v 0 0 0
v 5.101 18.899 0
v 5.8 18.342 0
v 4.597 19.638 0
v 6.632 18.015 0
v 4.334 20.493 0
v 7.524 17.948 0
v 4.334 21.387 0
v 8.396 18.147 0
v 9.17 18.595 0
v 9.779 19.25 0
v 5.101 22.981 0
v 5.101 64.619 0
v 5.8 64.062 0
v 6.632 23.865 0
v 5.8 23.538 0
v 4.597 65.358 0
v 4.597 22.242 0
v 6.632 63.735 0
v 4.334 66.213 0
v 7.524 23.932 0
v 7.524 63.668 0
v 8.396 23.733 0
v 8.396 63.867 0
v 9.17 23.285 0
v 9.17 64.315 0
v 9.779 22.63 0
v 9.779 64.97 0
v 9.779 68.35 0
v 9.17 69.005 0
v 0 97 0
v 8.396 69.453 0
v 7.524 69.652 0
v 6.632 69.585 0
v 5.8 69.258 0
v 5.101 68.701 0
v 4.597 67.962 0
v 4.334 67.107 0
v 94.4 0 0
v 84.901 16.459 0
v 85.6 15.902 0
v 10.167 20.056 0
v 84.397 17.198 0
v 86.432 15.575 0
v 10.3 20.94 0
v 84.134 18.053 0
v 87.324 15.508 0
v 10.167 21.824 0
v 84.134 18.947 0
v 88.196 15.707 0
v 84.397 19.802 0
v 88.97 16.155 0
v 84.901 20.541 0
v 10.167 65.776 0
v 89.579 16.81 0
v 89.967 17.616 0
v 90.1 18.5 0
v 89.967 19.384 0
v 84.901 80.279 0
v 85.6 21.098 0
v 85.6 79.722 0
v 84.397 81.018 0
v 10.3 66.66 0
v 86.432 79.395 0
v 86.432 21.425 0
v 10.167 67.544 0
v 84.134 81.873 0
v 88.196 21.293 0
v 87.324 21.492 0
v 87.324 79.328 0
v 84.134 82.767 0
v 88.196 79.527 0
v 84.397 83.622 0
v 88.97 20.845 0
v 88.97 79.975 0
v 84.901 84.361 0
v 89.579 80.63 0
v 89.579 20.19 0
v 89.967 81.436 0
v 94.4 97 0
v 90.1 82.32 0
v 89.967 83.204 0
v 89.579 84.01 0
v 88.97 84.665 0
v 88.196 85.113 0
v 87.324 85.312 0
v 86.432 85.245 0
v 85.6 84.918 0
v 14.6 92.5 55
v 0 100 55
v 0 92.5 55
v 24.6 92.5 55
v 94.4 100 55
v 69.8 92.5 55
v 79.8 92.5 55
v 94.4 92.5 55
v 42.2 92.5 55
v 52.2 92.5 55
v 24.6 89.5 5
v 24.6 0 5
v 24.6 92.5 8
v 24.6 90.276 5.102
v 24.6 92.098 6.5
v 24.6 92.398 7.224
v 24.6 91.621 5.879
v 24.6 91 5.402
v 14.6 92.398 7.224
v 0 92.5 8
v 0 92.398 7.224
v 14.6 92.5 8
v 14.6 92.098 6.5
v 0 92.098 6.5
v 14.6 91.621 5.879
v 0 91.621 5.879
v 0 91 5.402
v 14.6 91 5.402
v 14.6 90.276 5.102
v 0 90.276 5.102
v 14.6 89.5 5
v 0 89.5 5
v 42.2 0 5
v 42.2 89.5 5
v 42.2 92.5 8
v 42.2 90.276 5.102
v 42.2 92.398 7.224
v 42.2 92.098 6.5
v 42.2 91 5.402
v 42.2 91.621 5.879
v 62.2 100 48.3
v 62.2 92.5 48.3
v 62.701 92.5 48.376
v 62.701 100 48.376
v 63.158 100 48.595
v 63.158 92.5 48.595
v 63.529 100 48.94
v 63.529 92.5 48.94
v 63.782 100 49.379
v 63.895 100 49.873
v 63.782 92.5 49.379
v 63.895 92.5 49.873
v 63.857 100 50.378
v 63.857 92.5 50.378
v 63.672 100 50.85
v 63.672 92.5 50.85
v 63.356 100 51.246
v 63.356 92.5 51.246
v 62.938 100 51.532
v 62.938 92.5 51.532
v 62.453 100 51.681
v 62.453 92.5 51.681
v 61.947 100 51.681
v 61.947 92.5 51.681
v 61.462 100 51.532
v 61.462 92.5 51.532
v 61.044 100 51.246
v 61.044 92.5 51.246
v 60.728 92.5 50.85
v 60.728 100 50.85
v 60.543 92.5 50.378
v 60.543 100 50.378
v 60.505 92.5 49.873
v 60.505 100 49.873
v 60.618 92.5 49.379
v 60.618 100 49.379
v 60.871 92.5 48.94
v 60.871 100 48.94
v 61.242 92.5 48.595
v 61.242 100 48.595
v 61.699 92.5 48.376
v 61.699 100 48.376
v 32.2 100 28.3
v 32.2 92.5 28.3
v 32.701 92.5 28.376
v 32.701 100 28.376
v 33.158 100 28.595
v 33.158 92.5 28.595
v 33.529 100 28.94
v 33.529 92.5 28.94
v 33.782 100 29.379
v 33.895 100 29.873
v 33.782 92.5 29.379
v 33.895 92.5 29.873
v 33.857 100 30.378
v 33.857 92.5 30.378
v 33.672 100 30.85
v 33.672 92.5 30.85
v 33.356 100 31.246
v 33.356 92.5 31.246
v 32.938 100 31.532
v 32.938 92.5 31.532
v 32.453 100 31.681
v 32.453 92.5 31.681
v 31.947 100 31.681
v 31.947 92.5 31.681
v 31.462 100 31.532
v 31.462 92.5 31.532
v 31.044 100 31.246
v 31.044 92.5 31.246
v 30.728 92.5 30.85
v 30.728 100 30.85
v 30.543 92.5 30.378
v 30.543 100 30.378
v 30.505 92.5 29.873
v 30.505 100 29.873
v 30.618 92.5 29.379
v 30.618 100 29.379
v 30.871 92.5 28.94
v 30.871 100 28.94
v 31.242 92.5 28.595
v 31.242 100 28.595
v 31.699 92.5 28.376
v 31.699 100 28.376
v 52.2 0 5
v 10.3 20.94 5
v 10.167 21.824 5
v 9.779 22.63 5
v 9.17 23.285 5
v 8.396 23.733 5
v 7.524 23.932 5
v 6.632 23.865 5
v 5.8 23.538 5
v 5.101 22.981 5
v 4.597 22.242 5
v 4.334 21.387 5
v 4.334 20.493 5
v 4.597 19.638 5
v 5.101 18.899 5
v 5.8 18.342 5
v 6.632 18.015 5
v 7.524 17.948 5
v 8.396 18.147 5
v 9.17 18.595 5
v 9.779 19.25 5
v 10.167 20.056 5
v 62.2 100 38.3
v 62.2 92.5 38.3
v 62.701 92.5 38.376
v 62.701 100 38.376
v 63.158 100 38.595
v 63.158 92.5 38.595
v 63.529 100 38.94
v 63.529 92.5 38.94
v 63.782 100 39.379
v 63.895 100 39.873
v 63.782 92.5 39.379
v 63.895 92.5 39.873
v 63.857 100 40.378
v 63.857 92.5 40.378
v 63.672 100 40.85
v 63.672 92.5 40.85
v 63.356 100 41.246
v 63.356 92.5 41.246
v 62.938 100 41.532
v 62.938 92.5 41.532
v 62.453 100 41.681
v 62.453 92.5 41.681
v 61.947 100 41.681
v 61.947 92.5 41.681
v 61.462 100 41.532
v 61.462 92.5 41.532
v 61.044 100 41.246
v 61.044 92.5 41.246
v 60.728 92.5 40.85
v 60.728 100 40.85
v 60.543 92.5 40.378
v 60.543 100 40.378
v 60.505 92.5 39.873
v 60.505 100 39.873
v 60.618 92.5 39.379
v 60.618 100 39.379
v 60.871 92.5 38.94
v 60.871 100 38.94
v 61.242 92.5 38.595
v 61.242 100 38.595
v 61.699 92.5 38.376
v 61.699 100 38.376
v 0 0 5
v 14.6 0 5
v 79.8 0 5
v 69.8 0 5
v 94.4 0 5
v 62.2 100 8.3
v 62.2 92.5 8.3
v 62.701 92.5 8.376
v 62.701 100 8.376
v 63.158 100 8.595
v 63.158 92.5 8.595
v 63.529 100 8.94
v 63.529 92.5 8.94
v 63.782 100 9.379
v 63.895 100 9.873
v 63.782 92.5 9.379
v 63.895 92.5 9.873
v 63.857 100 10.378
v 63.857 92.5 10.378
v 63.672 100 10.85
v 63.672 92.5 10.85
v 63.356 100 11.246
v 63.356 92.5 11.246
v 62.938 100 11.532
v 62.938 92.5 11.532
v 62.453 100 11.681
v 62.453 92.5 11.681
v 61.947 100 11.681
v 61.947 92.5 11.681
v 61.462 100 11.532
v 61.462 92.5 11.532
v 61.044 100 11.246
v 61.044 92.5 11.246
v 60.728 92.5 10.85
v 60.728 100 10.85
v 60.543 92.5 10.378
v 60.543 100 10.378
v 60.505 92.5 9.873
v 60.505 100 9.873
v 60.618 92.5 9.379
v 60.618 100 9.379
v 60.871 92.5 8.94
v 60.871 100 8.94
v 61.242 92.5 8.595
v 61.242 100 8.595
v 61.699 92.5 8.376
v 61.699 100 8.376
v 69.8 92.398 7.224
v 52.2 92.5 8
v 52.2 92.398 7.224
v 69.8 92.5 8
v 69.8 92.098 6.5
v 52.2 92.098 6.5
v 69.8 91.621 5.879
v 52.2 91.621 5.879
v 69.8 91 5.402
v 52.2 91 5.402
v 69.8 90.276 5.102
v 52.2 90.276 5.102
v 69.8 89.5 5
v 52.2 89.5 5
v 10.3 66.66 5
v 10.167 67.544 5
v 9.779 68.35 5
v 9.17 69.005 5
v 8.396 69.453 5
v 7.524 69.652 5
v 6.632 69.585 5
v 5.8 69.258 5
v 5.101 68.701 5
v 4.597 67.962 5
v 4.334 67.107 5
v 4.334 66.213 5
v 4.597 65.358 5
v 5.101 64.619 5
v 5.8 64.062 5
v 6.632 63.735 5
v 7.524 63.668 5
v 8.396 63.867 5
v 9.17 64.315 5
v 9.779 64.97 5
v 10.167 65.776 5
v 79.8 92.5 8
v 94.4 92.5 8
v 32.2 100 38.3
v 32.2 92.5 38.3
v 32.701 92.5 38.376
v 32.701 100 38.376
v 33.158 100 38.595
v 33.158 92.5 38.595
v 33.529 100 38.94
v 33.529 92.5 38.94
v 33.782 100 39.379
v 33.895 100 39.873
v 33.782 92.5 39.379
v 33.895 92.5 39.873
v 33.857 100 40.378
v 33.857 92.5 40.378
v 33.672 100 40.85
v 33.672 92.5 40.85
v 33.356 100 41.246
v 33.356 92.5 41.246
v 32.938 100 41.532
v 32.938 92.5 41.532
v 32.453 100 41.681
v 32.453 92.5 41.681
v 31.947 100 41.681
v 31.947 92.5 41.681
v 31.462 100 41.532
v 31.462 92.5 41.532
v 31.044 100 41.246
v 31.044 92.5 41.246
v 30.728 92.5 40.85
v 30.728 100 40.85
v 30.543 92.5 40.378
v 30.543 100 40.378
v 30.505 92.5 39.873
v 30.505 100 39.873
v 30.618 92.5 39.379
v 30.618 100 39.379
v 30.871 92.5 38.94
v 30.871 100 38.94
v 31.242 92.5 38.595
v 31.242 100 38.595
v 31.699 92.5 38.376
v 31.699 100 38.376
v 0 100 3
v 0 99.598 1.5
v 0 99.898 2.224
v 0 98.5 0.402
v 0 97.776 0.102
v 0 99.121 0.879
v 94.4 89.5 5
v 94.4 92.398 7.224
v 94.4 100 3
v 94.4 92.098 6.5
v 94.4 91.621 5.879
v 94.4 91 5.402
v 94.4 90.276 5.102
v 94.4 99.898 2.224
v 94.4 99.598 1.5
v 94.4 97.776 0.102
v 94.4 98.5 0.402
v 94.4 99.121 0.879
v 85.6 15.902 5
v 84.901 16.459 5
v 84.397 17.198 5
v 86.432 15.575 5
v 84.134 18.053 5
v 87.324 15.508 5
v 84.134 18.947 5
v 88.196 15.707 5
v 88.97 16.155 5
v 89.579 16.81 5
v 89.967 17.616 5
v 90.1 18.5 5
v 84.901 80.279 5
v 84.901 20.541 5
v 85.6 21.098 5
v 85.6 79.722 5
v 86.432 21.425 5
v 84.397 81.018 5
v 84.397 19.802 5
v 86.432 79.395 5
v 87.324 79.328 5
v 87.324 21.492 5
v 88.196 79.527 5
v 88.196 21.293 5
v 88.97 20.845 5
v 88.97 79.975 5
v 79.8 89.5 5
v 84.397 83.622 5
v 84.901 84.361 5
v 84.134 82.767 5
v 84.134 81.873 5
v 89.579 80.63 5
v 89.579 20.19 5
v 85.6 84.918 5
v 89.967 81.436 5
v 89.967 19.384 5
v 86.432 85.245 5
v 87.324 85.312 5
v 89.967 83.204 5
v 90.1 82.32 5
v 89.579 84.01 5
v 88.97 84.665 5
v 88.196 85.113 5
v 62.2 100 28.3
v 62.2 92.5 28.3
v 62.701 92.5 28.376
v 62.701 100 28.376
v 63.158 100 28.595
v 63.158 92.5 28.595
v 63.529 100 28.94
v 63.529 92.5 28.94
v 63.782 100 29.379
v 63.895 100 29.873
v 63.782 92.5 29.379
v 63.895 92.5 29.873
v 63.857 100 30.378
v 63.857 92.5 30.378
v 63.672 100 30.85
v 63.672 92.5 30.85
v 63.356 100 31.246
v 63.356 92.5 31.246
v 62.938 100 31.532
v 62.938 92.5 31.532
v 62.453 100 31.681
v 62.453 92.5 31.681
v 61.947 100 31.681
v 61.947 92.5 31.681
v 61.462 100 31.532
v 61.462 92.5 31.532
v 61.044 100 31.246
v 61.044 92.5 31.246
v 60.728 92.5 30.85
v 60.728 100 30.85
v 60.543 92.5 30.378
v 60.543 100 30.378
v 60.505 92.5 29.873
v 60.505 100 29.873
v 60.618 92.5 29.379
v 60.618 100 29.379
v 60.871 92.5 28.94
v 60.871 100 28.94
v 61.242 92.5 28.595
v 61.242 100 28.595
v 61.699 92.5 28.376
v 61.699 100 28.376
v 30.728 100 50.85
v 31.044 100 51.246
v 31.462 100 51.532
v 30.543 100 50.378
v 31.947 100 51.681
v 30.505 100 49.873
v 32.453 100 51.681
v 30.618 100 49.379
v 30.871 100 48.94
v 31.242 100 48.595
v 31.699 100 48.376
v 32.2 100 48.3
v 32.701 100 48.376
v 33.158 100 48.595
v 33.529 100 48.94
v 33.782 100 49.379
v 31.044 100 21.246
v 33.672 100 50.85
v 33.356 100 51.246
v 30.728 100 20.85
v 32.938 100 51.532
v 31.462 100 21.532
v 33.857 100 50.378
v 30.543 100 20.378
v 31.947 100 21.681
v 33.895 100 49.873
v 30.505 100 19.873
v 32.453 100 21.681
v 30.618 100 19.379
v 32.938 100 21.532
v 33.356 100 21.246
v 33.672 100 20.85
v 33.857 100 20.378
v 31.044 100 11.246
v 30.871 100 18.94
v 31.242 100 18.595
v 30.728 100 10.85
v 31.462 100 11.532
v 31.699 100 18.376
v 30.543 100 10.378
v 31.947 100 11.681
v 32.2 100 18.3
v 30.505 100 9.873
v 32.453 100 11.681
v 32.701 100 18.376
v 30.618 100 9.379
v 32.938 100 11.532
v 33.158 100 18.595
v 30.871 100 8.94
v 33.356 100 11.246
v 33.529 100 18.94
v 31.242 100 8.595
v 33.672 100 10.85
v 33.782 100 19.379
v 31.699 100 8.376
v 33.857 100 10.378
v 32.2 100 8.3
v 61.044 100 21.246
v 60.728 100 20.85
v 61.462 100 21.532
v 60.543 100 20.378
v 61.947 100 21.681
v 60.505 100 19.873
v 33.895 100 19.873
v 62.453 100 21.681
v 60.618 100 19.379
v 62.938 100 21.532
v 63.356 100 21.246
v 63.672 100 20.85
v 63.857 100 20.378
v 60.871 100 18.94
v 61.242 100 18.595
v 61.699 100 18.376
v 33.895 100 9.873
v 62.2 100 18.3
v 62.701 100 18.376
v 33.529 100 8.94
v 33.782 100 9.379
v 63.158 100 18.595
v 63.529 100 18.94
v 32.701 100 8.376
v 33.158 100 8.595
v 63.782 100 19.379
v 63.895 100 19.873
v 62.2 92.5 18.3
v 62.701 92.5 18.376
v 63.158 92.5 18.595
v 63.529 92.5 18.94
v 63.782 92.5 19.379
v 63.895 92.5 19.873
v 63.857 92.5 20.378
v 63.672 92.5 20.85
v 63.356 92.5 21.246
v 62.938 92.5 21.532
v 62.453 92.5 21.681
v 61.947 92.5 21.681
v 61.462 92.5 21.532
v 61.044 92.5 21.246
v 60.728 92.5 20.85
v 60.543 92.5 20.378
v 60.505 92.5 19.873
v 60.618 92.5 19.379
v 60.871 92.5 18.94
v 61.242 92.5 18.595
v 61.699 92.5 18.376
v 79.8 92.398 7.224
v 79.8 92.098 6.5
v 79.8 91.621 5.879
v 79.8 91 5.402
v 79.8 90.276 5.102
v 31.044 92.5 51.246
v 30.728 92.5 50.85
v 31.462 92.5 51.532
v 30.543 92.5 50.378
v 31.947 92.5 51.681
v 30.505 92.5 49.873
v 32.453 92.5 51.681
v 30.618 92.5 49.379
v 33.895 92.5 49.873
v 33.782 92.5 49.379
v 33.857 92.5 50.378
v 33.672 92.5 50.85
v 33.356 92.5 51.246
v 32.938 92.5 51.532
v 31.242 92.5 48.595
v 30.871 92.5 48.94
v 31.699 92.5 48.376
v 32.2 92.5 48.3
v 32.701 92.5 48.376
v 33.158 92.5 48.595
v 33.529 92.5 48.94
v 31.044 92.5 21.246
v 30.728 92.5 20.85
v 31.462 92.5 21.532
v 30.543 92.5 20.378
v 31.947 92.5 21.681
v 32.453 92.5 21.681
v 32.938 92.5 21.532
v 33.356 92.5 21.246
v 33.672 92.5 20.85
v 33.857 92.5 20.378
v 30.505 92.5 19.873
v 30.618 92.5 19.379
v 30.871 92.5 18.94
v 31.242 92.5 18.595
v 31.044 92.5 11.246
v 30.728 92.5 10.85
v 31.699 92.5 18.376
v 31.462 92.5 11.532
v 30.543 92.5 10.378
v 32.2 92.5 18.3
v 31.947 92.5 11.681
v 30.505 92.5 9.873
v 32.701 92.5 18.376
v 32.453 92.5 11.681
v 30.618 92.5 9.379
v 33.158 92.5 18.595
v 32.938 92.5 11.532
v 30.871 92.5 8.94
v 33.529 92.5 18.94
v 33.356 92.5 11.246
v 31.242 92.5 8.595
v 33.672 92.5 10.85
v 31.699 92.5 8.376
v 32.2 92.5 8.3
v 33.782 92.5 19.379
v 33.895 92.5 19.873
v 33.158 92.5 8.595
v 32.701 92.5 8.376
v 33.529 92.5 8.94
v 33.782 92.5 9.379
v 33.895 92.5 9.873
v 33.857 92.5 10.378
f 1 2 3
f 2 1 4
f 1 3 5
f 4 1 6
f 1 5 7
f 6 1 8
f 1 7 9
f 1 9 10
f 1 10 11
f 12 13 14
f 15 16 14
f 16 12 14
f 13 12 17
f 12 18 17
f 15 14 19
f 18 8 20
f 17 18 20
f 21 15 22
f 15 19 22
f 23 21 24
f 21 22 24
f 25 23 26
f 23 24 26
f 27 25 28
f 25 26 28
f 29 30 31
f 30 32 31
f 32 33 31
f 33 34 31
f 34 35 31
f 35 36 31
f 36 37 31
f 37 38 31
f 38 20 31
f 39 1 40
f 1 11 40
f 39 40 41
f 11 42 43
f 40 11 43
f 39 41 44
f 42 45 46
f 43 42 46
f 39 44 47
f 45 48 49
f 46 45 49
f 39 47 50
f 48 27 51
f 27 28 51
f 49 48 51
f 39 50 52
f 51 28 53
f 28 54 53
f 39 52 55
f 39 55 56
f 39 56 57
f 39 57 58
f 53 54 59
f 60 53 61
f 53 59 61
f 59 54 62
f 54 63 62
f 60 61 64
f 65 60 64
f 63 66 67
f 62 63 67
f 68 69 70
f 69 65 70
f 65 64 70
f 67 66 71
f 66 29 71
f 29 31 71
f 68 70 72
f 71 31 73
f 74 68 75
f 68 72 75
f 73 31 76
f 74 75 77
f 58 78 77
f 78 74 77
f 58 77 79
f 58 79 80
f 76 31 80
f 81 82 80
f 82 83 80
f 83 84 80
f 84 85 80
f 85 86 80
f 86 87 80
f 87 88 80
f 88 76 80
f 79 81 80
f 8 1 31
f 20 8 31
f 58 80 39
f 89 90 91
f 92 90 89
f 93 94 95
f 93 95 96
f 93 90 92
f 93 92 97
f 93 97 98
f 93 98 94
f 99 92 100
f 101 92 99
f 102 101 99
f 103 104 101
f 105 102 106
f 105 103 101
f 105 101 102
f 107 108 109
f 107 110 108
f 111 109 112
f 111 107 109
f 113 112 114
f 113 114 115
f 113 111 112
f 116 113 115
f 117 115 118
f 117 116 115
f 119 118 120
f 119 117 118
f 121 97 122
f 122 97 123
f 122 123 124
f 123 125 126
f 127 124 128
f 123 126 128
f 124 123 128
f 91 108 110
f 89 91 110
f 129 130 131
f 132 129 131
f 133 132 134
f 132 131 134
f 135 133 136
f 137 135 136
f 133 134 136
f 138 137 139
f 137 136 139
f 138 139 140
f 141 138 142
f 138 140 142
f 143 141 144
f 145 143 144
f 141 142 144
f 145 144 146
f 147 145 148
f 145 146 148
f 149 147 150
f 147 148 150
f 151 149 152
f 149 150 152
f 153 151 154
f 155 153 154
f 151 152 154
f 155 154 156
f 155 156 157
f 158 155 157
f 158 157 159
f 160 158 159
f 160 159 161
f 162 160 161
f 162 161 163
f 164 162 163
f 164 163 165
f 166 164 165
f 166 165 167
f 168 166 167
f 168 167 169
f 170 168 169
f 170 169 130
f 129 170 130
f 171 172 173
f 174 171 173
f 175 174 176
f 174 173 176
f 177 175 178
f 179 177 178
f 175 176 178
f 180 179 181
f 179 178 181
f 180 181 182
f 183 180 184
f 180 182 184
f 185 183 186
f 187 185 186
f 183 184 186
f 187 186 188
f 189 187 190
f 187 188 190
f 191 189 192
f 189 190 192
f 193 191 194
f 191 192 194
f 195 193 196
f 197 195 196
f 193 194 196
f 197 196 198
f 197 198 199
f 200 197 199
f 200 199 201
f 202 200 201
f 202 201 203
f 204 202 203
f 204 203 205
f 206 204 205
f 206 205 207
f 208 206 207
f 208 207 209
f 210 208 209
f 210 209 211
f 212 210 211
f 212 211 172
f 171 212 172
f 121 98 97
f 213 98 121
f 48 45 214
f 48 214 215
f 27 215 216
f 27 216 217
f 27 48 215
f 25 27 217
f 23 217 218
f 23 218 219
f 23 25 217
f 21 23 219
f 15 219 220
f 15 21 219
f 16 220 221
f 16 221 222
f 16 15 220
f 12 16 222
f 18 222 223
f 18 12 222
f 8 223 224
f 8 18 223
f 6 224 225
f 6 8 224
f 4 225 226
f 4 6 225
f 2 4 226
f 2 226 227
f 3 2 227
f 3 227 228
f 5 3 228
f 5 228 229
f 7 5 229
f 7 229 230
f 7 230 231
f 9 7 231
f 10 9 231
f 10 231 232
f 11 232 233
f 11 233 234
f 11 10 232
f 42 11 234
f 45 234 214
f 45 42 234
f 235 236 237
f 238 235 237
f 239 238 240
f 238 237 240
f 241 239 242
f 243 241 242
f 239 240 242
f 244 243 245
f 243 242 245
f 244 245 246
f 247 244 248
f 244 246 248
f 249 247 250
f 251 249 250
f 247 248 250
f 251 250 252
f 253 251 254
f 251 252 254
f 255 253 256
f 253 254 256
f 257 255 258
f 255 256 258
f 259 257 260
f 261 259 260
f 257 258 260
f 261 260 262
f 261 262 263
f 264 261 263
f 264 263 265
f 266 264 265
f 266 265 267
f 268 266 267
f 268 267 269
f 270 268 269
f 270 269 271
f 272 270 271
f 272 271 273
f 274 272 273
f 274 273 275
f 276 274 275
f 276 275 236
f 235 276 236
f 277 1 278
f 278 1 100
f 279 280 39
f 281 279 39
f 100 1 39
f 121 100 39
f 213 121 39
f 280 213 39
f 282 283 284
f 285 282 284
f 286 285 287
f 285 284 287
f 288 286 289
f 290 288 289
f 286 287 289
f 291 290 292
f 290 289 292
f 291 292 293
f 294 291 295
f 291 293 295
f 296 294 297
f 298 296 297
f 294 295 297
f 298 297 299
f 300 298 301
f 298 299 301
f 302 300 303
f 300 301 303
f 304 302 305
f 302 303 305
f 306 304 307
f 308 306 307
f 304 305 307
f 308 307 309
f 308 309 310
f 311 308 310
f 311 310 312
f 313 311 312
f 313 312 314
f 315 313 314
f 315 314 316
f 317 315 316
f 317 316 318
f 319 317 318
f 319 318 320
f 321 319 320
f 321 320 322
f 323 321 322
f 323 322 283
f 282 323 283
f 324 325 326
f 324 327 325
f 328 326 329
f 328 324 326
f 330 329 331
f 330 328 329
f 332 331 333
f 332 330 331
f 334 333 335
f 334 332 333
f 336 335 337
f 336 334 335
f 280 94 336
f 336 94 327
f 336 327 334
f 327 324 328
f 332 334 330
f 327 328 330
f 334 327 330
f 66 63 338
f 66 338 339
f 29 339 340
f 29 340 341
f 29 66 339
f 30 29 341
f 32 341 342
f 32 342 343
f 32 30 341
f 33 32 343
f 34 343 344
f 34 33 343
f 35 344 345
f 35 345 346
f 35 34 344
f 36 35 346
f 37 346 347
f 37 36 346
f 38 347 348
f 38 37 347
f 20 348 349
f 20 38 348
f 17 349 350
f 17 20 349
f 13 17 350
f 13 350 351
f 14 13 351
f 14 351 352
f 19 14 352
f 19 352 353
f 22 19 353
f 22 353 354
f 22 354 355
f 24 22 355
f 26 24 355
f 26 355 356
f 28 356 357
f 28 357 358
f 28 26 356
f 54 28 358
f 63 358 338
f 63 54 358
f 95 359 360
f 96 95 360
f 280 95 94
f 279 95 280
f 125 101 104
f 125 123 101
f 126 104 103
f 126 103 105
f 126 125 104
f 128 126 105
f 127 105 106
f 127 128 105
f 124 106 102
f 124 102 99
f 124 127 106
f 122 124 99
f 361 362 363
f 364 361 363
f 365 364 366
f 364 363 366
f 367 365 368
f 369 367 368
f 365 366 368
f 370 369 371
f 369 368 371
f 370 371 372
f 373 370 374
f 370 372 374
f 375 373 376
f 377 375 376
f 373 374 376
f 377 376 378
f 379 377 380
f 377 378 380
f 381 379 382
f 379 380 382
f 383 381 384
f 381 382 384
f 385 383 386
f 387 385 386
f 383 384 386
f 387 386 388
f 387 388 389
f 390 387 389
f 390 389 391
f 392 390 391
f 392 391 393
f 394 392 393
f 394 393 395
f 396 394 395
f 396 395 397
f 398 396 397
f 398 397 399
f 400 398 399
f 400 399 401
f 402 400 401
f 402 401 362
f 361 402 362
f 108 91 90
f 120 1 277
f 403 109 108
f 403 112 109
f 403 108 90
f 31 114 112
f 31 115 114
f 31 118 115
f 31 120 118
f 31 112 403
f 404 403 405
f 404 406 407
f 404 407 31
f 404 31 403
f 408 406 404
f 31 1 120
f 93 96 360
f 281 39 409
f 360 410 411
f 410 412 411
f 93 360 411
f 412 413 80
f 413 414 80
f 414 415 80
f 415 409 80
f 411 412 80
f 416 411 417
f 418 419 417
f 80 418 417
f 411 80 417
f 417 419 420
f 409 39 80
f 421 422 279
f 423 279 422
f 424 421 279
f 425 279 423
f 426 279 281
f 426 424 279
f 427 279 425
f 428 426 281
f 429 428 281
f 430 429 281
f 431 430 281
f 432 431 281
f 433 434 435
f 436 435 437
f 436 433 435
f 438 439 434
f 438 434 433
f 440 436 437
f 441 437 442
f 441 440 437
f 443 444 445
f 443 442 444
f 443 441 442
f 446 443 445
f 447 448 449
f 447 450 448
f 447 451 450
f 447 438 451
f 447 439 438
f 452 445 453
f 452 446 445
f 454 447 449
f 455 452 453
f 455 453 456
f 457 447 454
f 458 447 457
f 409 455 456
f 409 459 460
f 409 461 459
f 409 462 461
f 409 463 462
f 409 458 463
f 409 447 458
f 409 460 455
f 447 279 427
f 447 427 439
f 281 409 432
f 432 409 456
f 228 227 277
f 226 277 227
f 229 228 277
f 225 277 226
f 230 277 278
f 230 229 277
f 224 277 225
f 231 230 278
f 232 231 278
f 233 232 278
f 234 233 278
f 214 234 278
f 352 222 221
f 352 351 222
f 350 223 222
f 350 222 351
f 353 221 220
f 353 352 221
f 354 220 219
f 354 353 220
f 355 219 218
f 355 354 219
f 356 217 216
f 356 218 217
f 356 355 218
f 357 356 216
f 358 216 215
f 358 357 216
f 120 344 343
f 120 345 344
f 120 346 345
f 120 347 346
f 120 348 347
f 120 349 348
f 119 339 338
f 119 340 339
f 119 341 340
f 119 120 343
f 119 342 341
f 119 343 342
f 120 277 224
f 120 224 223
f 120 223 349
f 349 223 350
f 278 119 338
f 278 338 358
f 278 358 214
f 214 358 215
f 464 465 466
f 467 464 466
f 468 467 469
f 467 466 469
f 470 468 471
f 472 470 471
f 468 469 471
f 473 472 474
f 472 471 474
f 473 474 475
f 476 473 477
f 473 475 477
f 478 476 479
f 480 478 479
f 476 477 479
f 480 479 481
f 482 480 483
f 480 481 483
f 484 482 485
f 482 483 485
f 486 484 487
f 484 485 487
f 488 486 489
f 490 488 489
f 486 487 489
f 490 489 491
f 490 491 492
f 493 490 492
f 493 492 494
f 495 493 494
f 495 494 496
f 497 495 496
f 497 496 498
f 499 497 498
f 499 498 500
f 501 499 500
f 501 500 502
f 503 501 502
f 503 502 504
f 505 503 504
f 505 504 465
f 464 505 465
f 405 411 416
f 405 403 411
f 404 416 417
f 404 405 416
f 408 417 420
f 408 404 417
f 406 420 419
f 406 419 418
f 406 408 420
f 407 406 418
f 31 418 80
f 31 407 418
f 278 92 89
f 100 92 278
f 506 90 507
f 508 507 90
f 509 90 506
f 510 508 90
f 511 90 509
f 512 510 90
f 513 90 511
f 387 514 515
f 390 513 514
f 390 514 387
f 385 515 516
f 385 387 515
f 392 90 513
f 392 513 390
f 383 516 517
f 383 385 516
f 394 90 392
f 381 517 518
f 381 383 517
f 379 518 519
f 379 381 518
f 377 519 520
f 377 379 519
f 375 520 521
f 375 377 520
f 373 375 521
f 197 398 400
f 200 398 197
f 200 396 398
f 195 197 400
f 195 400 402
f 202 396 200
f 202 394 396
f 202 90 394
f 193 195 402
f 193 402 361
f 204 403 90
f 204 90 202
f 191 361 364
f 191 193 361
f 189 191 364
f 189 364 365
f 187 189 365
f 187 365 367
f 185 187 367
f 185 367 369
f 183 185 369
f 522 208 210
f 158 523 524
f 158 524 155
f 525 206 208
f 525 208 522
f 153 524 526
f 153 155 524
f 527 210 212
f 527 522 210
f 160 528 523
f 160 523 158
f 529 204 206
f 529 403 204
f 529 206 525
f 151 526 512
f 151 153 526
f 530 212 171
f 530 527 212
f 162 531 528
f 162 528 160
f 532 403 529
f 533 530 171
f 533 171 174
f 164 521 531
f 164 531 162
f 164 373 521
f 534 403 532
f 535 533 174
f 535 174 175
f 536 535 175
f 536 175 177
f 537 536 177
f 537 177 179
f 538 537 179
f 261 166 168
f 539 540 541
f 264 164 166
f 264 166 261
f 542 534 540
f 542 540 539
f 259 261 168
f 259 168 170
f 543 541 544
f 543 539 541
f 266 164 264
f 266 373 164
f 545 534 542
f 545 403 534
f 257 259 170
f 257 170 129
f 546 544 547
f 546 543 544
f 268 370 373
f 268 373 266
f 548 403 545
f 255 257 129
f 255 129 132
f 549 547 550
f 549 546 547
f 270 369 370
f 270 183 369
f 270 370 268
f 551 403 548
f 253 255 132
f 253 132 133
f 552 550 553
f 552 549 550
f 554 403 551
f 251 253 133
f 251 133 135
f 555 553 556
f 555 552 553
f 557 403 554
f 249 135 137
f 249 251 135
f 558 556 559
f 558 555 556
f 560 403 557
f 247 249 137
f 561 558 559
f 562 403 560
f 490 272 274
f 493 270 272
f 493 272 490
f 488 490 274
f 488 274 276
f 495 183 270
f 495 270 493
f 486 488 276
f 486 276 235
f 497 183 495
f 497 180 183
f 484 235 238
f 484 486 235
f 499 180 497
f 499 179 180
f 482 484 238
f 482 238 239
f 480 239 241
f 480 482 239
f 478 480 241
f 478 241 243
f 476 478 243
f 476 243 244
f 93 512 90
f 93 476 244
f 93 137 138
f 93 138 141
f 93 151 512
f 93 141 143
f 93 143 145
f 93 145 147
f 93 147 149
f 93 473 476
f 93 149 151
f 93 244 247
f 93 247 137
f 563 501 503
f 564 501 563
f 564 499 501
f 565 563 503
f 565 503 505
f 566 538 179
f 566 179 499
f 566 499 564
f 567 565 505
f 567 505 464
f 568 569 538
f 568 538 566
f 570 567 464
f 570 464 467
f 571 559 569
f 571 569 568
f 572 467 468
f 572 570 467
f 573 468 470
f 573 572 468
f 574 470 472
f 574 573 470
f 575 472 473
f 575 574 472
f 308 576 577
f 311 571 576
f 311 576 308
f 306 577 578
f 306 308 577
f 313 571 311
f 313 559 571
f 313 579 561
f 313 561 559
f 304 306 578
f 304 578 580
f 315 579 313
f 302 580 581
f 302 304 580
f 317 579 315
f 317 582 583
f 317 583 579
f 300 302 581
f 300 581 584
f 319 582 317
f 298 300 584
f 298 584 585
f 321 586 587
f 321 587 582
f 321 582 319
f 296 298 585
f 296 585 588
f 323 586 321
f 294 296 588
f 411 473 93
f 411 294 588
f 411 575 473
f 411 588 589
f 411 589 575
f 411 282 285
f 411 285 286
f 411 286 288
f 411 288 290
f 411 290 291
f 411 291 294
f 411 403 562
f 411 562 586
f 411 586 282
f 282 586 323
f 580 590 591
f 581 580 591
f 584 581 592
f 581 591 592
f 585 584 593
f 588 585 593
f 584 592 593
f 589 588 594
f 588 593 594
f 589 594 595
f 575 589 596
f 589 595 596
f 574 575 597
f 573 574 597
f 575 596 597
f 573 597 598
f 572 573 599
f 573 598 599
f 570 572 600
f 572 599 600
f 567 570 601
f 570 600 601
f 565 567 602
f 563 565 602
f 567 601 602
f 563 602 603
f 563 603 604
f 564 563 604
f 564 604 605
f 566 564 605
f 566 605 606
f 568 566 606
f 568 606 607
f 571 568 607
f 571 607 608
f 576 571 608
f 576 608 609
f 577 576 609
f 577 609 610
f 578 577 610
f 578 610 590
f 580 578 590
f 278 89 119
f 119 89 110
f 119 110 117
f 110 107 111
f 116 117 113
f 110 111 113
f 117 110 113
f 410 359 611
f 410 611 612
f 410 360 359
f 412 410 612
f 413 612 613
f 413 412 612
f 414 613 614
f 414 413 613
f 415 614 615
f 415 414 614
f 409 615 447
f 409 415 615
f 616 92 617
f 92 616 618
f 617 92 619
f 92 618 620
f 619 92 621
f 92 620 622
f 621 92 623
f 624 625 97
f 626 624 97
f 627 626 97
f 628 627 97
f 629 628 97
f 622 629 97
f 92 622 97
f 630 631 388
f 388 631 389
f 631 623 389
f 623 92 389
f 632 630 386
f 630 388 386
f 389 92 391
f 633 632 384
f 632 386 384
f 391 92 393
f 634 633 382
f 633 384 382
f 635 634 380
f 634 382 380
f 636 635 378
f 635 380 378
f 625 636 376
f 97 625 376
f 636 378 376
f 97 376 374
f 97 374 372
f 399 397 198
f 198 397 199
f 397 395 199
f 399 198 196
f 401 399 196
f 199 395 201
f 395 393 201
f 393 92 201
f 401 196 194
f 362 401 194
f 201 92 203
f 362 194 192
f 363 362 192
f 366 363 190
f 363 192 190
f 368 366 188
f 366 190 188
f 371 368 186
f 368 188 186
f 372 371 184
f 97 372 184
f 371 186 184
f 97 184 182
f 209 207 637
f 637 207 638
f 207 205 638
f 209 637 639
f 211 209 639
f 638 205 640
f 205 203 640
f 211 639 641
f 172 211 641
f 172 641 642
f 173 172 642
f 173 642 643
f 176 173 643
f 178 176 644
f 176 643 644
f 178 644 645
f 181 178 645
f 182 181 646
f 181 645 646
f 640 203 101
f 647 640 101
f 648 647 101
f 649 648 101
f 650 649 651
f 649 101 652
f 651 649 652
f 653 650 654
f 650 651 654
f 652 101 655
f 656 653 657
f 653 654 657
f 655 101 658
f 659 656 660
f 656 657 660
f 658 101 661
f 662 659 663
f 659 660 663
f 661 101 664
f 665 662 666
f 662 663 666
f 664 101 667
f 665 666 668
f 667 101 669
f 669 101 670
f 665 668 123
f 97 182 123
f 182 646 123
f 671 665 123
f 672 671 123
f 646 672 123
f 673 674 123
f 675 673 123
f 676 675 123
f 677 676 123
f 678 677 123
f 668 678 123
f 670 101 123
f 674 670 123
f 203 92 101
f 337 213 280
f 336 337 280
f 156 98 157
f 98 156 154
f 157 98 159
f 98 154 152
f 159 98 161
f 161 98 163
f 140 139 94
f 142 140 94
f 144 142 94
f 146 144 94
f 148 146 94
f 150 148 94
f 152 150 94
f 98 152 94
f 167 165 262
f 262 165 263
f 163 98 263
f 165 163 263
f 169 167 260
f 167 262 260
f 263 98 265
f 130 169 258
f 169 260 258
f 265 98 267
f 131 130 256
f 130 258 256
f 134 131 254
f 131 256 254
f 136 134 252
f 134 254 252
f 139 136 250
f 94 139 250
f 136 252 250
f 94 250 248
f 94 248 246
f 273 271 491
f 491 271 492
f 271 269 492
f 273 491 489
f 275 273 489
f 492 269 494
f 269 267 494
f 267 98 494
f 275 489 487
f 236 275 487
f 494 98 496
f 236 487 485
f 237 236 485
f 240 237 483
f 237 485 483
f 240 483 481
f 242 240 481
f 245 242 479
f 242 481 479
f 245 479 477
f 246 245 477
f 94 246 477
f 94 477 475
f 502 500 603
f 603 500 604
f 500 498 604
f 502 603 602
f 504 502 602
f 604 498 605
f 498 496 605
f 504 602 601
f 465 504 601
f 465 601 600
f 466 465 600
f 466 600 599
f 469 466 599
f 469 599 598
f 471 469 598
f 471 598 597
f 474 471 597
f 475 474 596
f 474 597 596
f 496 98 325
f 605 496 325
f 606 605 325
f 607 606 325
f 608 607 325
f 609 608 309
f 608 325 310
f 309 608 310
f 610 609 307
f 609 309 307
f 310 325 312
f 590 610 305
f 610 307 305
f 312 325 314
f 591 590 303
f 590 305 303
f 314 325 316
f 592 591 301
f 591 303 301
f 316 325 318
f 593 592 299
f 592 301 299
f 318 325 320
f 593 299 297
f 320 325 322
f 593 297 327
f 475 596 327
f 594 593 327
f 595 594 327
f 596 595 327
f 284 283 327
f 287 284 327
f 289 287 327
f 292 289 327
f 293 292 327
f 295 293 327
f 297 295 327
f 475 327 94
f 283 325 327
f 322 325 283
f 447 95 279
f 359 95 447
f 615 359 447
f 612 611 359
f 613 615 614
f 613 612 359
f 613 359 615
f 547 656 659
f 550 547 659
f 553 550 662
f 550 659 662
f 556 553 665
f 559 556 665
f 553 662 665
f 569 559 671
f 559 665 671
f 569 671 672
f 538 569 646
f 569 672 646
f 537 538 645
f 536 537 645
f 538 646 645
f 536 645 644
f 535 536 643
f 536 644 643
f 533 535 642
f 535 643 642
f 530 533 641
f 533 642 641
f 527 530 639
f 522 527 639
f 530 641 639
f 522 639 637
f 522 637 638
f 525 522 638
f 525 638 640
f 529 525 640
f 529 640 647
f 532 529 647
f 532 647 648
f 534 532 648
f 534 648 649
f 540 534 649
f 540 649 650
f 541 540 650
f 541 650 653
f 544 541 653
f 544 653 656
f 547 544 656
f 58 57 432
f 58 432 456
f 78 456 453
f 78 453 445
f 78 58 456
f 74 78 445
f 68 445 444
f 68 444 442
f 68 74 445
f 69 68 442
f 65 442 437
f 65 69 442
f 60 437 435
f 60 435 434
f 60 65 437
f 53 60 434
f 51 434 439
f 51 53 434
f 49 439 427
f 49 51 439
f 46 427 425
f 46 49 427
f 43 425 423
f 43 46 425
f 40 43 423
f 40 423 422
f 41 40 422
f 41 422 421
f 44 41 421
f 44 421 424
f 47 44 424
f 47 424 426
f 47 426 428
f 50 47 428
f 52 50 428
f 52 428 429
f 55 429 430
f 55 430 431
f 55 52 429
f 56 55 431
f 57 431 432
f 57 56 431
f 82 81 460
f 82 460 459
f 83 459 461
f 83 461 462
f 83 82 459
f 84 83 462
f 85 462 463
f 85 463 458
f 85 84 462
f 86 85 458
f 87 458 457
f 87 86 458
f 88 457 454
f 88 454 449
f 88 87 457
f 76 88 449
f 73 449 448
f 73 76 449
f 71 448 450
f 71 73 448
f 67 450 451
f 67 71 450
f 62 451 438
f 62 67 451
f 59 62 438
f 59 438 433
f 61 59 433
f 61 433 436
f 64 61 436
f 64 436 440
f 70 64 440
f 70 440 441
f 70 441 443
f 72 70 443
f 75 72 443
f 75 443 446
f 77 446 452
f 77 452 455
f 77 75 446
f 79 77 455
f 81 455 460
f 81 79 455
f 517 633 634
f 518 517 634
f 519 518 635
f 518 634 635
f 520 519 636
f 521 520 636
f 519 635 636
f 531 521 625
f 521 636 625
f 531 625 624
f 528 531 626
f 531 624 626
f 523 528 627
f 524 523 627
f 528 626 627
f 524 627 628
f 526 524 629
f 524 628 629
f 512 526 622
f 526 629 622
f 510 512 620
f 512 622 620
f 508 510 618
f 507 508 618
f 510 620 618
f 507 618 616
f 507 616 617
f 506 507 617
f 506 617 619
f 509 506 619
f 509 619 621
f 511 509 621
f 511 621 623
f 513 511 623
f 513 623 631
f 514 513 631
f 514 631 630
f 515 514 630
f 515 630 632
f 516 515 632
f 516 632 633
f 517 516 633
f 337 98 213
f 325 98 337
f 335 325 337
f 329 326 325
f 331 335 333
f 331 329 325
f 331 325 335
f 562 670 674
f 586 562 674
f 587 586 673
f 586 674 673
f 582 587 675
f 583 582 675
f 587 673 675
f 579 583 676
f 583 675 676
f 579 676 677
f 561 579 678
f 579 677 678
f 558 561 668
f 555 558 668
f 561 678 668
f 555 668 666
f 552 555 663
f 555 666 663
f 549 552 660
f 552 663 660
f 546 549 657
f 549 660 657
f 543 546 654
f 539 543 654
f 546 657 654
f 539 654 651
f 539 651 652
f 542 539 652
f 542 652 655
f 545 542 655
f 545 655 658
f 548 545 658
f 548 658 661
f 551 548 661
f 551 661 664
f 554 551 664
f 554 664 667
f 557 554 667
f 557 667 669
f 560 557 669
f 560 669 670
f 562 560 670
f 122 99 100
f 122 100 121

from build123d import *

# Parameters (mm, degrees)
SKETCH1_W           = 2.4
SKETCH1_H           = 100
SKETCH1_W_2         = 92
SKETCH1_R           = 3
BOSS_EXTRUDE1_DEPTH = 5
SKETCH2_W           = 94.4
SKETCH2_H           = 7.5
BOSS_EXTRUDE2_DEPTH = 50
BOSS_EXTRUDE3_DEPTH = 5
LPATTERN1_COUNT     = 2
LPATTERN1_PITCH     = 27.6
LPATTERN1_COL_COUNT = 2
LPATTERN1_COL_PITCH = 27.6
FILLET1_R           = 3
CUT_EXTRUDE2_REACH  = 145.152
SKETCH9_R           = 1.7


with BuildPart() as part:
    # Sketch1 → Boss-Extrude1 (new body)
    # profile 1 of 2: a face of its own
    with BuildSketch(Plane.XY):
        with Locations((93.2, 50)):
            Rectangle(SKETCH1_W, SKETCH1_H)
    # profile 2 of 2: a face of its own
    with BuildSketch(Plane.XY):
        with Locations((46, 50)):
            Rectangle(SKETCH1_W_2, SKETCH1_H)
        with Locations((7.3, 20.94)):
            Circle(SKETCH1_R, mode=Mode.SUBTRACT)
        with Locations((87.1, 18.5)):
            Circle(SKETCH1_R, mode=Mode.SUBTRACT)
        with Locations((7.3, 66.66)):
            Circle(SKETCH1_R, mode=Mode.SUBTRACT)
        with Locations((87.1, 82.32)):
            Circle(SKETCH1_R, mode=Mode.SUBTRACT)
    extrude(amount=BOSS_EXTRUDE1_DEPTH)

    # Sketch2 → Boss-Extrude2 (add)
    with BuildSketch(Plane.XY.offset(5)):
        with Locations((47.2, 96.25)):
            Rectangle(SKETCH2_W, SKETCH2_H)
    extrude(amount=BOSS_EXTRUDE2_DEPTH)

    # Sketch7 → Boss-Extrude3 (add, symmetric)
    with BuildSketch(Plane(origin=(47.2, 0, 0), x_dir=(0, 0, -1), z_dir=(1, 0, 0))):
        Polygon((-55, 92.5), (-5, 0), (-5, 92.5), align=None)
    boss_extrude3 = extrude(amount=BOSS_EXTRUDE3_DEPTH, both=True)

    # LPattern1: Boss-Extrude3 ×2
    with Locations(*[(-i * LPATTERN1_PITCH, 0, 0) for i in range(1, LPATTERN1_COUNT)]):
        add(boss_extrude3)

    # LPattern1 col: Boss-Extrude3 ×2
    with Locations(*[(i * LPATTERN1_COL_PITCH, 0, 0) for i in range(1, LPATTERN1_COL_COUNT)]):
        add(boss_extrude3)

    # Fillet1
    fillet1_edges = [part.edges().sort_by_distance(p)[0] for p in [
        (47.2, 100, 0),
        (7.3, 92.5, 5),
        (61, 92.5, 5),
        (87.1, 92.5, 5),
        (33.4, 92.5, 5),
    ]]
    fillet(fillet1_edges, radius=FILLET1_R)

    # Sketch9 → Cut-Extrude2 (cut, up to next)
    with BuildSketch(Plane.XZ.offset(-92.5), mode=Mode.PRIVATE) as cut_extrude2_sk1:
        with Locations(Location((32.2, 50, 0), (0, 0, 270))):
            Circle(SKETCH9_R)
    cut_extrude2_tool1 = extrude(cut_extrude2_sk1.sketch, amount=-CUT_EXTRUDE2_REACH, mode=Mode.PRIVATE) & part.part
    # Sketch9 → Cut-Extrude2 (cut, up to next)
    with BuildSketch(Plane.XZ.offset(-92.5), mode=Mode.PRIVATE) as cut_extrude2_sk2:
        with Locations(Location((62.2, 50, 0), (0, 0, 270))):
            Circle(SKETCH9_R)
    cut_extrude2_tool2 = extrude(cut_extrude2_sk2.sketch, amount=-CUT_EXTRUDE2_REACH, mode=Mode.PRIVATE) & part.part
    # Sketch9 → Cut-Extrude2 (cut, up to next)
    with BuildSketch(Plane.XZ.offset(-92.5), mode=Mode.PRIVATE) as cut_extrude2_sk3:
        with Locations(Location((62.2, 40, 0), (0, 0, 270))):
            Circle(SKETCH9_R)
    cut_extrude2_tool3 = extrude(cut_extrude2_sk3.sketch, amount=-CUT_EXTRUDE2_REACH, mode=Mode.PRIVATE) & part.part
    # Sketch9 → Cut-Extrude2 (cut, up to next)
    with BuildSketch(Plane.XZ.offset(-92.5), mode=Mode.PRIVATE) as cut_extrude2_sk4:
        with Locations(Location((62.2, 30, 0), (0, 0, 270))):
            Circle(SKETCH9_R)
    cut_extrude2_tool4 = extrude(cut_extrude2_sk4.sketch, amount=-CUT_EXTRUDE2_REACH, mode=Mode.PRIVATE) & part.part
    # Sketch9 → Cut-Extrude2 (cut, up to next)
    with BuildSketch(Plane.XZ.offset(-92.5), mode=Mode.PRIVATE) as cut_extrude2_sk5:
        with Locations(Location((62.2, 20, 0), (0, 0, 270))):
            Circle(SKETCH9_R)
    cut_extrude2_tool5 = extrude(cut_extrude2_sk5.sketch, amount=-CUT_EXTRUDE2_REACH, mode=Mode.PRIVATE) & part.part
    # Sketch9 → Cut-Extrude2 (cut, up to next)
    with BuildSketch(Plane.XZ.offset(-92.5), mode=Mode.PRIVATE) as cut_extrude2_sk6:
        with Locations(Location((62.2, 10, 0), (0, 0, 270))):
            Circle(SKETCH9_R)
    cut_extrude2_tool6 = extrude(cut_extrude2_sk6.sketch, amount=-CUT_EXTRUDE2_REACH, mode=Mode.PRIVATE) & part.part
    # Sketch9 → Cut-Extrude2 (cut, up to next)
    with BuildSketch(Plane.XZ.offset(-92.5), mode=Mode.PRIVATE) as cut_extrude2_sk7:
        with Locations(Location((32.2, 40, 0), (0, 0, 270))):
            Circle(SKETCH9_R)
    cut_extrude2_tool7 = extrude(cut_extrude2_sk7.sketch, amount=-CUT_EXTRUDE2_REACH, mode=Mode.PRIVATE) & part.part
    # Sketch9 → Cut-Extrude2 (cut, up to next)
    with BuildSketch(Plane.XZ.offset(-92.5), mode=Mode.PRIVATE) as cut_extrude2_sk8:
        with Locations(Location((32.2, 30, 0), (0, 0, 270))):
            Circle(SKETCH9_R)
    cut_extrude2_tool8 = extrude(cut_extrude2_sk8.sketch, amount=-CUT_EXTRUDE2_REACH, mode=Mode.PRIVATE) & part.part
    # Sketch9 → Cut-Extrude2 (cut, up to next)
    with BuildSketch(Plane.XZ.offset(-92.5), mode=Mode.PRIVATE) as cut_extrude2_sk9:
        with Locations(Location((32.2, 20, 0), (0, 0, 270))):
            Circle(SKETCH9_R)
    cut_extrude2_tool9 = extrude(cut_extrude2_sk9.sketch, amount=-CUT_EXTRUDE2_REACH, mode=Mode.PRIVATE) & part.part
    # Sketch9 → Cut-Extrude2 (cut, up to next)
    with BuildSketch(Plane.XZ.offset(-92.5), mode=Mode.PRIVATE) as cut_extrude2_sk10:
        with Locations(Location((32.2, 10, 0), (0, 0, 270))):
            Circle(SKETCH9_R)
    cut_extrude2_tool10 = extrude(cut_extrude2_sk10.sketch, amount=-CUT_EXTRUDE2_REACH, mode=Mode.PRIVATE) & part.part
    add(cut_extrude2_tool1.solids().sort_by_distance((32.2, 92.5, 50))[0], mode=Mode.SUBTRACT)
    add(cut_extrude2_tool2.solids().sort_by_distance((62.2, 92.5, 50))[0], mode=Mode.SUBTRACT)
    add(cut_extrude2_tool3.solids().sort_by_distance((62.2, 92.5, 40))[0], mode=Mode.SUBTRACT)
    add(cut_extrude2_tool4.solids().sort_by_distance((62.2, 92.5, 30))[0], mode=Mode.SUBTRACT)
    add(cut_extrude2_tool5.solids().sort_by_distance((62.2, 92.5, 20))[0], mode=Mode.SUBTRACT)
    add(cut_extrude2_tool6.solids().sort_by_distance((62.2, 92.5, 10))[0], mode=Mode.SUBTRACT)
    add(cut_extrude2_tool7.solids().sort_by_distance((32.2, 92.5, 40))[0], mode=Mode.SUBTRACT)
    add(cut_extrude2_tool8.solids().sort_by_distance((32.2, 92.5, 30))[0], mode=Mode.SUBTRACT)
    add(cut_extrude2_tool9.solids().sort_by_distance((32.2, 92.5, 20))[0], mode=Mode.SUBTRACT)
    add(cut_extrude2_tool10.solids().sort_by_distance((32.2, 92.5, 10))[0], mode=Mode.SUBTRACT)


solid = part.part
